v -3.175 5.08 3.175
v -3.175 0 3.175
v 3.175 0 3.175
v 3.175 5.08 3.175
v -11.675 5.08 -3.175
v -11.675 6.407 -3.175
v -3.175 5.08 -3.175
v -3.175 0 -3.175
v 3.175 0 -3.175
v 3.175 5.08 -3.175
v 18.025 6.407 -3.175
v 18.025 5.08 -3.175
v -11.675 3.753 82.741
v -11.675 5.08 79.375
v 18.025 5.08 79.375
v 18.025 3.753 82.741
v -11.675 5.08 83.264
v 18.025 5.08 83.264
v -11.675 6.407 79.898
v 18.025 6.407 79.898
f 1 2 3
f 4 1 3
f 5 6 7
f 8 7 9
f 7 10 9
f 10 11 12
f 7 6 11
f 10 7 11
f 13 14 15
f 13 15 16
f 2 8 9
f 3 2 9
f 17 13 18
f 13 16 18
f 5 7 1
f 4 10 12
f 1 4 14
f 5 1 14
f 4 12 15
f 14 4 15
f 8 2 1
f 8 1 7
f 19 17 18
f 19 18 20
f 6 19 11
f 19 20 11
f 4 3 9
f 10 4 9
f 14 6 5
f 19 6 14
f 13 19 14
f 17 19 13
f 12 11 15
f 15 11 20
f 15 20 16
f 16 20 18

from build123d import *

# Parameters (mm, degrees)
SKETCH1_W                = 6.35
SKETCH1_H                = 6.35
BOSS_EXTRUDE1_DEPTH      = 5.08
BOSS_EXTRUDE2_DEPTH      = 14.850000018
BOSS_EXTRUDE2_DEPTH_BACK = 14.850000018


with BuildPart() as part:
    # Sketch1 → Boss-Extrude1 (new body)
    with BuildSketch(Plane(origin=(0, 0, 0), x_dir=(1, 0, 0), z_dir=(0, 1, 0))):
        Rectangle(SKETCH1_W, SKETCH1_H)
    extrude(amount=BOSS_EXTRUDE1_DEPTH)

    # Sketch2 → Boss-Extrude2 (add, two sides)
    with BuildSketch(Plane(origin=(3.175, 0, 0), x_dir=(0, 0, -1), z_dir=(1, 0, 0))) as boss_extrude2_sk:
        Polygon((3.175, 5.08), (-79.375, 5.08), (-82.741289638, 3.753009016), (-83.26438933, 5.08), (-79.898099692, 6.406990984), (3.175, 6.406990984), align=None)
    extrude(amount=BOSS_EXTRUDE2_DEPTH)
    extrude(boss_extrude2_sk.sketch, amount=-BOSS_EXTRUDE2_DEPTH_BACK)


solid = part.part
